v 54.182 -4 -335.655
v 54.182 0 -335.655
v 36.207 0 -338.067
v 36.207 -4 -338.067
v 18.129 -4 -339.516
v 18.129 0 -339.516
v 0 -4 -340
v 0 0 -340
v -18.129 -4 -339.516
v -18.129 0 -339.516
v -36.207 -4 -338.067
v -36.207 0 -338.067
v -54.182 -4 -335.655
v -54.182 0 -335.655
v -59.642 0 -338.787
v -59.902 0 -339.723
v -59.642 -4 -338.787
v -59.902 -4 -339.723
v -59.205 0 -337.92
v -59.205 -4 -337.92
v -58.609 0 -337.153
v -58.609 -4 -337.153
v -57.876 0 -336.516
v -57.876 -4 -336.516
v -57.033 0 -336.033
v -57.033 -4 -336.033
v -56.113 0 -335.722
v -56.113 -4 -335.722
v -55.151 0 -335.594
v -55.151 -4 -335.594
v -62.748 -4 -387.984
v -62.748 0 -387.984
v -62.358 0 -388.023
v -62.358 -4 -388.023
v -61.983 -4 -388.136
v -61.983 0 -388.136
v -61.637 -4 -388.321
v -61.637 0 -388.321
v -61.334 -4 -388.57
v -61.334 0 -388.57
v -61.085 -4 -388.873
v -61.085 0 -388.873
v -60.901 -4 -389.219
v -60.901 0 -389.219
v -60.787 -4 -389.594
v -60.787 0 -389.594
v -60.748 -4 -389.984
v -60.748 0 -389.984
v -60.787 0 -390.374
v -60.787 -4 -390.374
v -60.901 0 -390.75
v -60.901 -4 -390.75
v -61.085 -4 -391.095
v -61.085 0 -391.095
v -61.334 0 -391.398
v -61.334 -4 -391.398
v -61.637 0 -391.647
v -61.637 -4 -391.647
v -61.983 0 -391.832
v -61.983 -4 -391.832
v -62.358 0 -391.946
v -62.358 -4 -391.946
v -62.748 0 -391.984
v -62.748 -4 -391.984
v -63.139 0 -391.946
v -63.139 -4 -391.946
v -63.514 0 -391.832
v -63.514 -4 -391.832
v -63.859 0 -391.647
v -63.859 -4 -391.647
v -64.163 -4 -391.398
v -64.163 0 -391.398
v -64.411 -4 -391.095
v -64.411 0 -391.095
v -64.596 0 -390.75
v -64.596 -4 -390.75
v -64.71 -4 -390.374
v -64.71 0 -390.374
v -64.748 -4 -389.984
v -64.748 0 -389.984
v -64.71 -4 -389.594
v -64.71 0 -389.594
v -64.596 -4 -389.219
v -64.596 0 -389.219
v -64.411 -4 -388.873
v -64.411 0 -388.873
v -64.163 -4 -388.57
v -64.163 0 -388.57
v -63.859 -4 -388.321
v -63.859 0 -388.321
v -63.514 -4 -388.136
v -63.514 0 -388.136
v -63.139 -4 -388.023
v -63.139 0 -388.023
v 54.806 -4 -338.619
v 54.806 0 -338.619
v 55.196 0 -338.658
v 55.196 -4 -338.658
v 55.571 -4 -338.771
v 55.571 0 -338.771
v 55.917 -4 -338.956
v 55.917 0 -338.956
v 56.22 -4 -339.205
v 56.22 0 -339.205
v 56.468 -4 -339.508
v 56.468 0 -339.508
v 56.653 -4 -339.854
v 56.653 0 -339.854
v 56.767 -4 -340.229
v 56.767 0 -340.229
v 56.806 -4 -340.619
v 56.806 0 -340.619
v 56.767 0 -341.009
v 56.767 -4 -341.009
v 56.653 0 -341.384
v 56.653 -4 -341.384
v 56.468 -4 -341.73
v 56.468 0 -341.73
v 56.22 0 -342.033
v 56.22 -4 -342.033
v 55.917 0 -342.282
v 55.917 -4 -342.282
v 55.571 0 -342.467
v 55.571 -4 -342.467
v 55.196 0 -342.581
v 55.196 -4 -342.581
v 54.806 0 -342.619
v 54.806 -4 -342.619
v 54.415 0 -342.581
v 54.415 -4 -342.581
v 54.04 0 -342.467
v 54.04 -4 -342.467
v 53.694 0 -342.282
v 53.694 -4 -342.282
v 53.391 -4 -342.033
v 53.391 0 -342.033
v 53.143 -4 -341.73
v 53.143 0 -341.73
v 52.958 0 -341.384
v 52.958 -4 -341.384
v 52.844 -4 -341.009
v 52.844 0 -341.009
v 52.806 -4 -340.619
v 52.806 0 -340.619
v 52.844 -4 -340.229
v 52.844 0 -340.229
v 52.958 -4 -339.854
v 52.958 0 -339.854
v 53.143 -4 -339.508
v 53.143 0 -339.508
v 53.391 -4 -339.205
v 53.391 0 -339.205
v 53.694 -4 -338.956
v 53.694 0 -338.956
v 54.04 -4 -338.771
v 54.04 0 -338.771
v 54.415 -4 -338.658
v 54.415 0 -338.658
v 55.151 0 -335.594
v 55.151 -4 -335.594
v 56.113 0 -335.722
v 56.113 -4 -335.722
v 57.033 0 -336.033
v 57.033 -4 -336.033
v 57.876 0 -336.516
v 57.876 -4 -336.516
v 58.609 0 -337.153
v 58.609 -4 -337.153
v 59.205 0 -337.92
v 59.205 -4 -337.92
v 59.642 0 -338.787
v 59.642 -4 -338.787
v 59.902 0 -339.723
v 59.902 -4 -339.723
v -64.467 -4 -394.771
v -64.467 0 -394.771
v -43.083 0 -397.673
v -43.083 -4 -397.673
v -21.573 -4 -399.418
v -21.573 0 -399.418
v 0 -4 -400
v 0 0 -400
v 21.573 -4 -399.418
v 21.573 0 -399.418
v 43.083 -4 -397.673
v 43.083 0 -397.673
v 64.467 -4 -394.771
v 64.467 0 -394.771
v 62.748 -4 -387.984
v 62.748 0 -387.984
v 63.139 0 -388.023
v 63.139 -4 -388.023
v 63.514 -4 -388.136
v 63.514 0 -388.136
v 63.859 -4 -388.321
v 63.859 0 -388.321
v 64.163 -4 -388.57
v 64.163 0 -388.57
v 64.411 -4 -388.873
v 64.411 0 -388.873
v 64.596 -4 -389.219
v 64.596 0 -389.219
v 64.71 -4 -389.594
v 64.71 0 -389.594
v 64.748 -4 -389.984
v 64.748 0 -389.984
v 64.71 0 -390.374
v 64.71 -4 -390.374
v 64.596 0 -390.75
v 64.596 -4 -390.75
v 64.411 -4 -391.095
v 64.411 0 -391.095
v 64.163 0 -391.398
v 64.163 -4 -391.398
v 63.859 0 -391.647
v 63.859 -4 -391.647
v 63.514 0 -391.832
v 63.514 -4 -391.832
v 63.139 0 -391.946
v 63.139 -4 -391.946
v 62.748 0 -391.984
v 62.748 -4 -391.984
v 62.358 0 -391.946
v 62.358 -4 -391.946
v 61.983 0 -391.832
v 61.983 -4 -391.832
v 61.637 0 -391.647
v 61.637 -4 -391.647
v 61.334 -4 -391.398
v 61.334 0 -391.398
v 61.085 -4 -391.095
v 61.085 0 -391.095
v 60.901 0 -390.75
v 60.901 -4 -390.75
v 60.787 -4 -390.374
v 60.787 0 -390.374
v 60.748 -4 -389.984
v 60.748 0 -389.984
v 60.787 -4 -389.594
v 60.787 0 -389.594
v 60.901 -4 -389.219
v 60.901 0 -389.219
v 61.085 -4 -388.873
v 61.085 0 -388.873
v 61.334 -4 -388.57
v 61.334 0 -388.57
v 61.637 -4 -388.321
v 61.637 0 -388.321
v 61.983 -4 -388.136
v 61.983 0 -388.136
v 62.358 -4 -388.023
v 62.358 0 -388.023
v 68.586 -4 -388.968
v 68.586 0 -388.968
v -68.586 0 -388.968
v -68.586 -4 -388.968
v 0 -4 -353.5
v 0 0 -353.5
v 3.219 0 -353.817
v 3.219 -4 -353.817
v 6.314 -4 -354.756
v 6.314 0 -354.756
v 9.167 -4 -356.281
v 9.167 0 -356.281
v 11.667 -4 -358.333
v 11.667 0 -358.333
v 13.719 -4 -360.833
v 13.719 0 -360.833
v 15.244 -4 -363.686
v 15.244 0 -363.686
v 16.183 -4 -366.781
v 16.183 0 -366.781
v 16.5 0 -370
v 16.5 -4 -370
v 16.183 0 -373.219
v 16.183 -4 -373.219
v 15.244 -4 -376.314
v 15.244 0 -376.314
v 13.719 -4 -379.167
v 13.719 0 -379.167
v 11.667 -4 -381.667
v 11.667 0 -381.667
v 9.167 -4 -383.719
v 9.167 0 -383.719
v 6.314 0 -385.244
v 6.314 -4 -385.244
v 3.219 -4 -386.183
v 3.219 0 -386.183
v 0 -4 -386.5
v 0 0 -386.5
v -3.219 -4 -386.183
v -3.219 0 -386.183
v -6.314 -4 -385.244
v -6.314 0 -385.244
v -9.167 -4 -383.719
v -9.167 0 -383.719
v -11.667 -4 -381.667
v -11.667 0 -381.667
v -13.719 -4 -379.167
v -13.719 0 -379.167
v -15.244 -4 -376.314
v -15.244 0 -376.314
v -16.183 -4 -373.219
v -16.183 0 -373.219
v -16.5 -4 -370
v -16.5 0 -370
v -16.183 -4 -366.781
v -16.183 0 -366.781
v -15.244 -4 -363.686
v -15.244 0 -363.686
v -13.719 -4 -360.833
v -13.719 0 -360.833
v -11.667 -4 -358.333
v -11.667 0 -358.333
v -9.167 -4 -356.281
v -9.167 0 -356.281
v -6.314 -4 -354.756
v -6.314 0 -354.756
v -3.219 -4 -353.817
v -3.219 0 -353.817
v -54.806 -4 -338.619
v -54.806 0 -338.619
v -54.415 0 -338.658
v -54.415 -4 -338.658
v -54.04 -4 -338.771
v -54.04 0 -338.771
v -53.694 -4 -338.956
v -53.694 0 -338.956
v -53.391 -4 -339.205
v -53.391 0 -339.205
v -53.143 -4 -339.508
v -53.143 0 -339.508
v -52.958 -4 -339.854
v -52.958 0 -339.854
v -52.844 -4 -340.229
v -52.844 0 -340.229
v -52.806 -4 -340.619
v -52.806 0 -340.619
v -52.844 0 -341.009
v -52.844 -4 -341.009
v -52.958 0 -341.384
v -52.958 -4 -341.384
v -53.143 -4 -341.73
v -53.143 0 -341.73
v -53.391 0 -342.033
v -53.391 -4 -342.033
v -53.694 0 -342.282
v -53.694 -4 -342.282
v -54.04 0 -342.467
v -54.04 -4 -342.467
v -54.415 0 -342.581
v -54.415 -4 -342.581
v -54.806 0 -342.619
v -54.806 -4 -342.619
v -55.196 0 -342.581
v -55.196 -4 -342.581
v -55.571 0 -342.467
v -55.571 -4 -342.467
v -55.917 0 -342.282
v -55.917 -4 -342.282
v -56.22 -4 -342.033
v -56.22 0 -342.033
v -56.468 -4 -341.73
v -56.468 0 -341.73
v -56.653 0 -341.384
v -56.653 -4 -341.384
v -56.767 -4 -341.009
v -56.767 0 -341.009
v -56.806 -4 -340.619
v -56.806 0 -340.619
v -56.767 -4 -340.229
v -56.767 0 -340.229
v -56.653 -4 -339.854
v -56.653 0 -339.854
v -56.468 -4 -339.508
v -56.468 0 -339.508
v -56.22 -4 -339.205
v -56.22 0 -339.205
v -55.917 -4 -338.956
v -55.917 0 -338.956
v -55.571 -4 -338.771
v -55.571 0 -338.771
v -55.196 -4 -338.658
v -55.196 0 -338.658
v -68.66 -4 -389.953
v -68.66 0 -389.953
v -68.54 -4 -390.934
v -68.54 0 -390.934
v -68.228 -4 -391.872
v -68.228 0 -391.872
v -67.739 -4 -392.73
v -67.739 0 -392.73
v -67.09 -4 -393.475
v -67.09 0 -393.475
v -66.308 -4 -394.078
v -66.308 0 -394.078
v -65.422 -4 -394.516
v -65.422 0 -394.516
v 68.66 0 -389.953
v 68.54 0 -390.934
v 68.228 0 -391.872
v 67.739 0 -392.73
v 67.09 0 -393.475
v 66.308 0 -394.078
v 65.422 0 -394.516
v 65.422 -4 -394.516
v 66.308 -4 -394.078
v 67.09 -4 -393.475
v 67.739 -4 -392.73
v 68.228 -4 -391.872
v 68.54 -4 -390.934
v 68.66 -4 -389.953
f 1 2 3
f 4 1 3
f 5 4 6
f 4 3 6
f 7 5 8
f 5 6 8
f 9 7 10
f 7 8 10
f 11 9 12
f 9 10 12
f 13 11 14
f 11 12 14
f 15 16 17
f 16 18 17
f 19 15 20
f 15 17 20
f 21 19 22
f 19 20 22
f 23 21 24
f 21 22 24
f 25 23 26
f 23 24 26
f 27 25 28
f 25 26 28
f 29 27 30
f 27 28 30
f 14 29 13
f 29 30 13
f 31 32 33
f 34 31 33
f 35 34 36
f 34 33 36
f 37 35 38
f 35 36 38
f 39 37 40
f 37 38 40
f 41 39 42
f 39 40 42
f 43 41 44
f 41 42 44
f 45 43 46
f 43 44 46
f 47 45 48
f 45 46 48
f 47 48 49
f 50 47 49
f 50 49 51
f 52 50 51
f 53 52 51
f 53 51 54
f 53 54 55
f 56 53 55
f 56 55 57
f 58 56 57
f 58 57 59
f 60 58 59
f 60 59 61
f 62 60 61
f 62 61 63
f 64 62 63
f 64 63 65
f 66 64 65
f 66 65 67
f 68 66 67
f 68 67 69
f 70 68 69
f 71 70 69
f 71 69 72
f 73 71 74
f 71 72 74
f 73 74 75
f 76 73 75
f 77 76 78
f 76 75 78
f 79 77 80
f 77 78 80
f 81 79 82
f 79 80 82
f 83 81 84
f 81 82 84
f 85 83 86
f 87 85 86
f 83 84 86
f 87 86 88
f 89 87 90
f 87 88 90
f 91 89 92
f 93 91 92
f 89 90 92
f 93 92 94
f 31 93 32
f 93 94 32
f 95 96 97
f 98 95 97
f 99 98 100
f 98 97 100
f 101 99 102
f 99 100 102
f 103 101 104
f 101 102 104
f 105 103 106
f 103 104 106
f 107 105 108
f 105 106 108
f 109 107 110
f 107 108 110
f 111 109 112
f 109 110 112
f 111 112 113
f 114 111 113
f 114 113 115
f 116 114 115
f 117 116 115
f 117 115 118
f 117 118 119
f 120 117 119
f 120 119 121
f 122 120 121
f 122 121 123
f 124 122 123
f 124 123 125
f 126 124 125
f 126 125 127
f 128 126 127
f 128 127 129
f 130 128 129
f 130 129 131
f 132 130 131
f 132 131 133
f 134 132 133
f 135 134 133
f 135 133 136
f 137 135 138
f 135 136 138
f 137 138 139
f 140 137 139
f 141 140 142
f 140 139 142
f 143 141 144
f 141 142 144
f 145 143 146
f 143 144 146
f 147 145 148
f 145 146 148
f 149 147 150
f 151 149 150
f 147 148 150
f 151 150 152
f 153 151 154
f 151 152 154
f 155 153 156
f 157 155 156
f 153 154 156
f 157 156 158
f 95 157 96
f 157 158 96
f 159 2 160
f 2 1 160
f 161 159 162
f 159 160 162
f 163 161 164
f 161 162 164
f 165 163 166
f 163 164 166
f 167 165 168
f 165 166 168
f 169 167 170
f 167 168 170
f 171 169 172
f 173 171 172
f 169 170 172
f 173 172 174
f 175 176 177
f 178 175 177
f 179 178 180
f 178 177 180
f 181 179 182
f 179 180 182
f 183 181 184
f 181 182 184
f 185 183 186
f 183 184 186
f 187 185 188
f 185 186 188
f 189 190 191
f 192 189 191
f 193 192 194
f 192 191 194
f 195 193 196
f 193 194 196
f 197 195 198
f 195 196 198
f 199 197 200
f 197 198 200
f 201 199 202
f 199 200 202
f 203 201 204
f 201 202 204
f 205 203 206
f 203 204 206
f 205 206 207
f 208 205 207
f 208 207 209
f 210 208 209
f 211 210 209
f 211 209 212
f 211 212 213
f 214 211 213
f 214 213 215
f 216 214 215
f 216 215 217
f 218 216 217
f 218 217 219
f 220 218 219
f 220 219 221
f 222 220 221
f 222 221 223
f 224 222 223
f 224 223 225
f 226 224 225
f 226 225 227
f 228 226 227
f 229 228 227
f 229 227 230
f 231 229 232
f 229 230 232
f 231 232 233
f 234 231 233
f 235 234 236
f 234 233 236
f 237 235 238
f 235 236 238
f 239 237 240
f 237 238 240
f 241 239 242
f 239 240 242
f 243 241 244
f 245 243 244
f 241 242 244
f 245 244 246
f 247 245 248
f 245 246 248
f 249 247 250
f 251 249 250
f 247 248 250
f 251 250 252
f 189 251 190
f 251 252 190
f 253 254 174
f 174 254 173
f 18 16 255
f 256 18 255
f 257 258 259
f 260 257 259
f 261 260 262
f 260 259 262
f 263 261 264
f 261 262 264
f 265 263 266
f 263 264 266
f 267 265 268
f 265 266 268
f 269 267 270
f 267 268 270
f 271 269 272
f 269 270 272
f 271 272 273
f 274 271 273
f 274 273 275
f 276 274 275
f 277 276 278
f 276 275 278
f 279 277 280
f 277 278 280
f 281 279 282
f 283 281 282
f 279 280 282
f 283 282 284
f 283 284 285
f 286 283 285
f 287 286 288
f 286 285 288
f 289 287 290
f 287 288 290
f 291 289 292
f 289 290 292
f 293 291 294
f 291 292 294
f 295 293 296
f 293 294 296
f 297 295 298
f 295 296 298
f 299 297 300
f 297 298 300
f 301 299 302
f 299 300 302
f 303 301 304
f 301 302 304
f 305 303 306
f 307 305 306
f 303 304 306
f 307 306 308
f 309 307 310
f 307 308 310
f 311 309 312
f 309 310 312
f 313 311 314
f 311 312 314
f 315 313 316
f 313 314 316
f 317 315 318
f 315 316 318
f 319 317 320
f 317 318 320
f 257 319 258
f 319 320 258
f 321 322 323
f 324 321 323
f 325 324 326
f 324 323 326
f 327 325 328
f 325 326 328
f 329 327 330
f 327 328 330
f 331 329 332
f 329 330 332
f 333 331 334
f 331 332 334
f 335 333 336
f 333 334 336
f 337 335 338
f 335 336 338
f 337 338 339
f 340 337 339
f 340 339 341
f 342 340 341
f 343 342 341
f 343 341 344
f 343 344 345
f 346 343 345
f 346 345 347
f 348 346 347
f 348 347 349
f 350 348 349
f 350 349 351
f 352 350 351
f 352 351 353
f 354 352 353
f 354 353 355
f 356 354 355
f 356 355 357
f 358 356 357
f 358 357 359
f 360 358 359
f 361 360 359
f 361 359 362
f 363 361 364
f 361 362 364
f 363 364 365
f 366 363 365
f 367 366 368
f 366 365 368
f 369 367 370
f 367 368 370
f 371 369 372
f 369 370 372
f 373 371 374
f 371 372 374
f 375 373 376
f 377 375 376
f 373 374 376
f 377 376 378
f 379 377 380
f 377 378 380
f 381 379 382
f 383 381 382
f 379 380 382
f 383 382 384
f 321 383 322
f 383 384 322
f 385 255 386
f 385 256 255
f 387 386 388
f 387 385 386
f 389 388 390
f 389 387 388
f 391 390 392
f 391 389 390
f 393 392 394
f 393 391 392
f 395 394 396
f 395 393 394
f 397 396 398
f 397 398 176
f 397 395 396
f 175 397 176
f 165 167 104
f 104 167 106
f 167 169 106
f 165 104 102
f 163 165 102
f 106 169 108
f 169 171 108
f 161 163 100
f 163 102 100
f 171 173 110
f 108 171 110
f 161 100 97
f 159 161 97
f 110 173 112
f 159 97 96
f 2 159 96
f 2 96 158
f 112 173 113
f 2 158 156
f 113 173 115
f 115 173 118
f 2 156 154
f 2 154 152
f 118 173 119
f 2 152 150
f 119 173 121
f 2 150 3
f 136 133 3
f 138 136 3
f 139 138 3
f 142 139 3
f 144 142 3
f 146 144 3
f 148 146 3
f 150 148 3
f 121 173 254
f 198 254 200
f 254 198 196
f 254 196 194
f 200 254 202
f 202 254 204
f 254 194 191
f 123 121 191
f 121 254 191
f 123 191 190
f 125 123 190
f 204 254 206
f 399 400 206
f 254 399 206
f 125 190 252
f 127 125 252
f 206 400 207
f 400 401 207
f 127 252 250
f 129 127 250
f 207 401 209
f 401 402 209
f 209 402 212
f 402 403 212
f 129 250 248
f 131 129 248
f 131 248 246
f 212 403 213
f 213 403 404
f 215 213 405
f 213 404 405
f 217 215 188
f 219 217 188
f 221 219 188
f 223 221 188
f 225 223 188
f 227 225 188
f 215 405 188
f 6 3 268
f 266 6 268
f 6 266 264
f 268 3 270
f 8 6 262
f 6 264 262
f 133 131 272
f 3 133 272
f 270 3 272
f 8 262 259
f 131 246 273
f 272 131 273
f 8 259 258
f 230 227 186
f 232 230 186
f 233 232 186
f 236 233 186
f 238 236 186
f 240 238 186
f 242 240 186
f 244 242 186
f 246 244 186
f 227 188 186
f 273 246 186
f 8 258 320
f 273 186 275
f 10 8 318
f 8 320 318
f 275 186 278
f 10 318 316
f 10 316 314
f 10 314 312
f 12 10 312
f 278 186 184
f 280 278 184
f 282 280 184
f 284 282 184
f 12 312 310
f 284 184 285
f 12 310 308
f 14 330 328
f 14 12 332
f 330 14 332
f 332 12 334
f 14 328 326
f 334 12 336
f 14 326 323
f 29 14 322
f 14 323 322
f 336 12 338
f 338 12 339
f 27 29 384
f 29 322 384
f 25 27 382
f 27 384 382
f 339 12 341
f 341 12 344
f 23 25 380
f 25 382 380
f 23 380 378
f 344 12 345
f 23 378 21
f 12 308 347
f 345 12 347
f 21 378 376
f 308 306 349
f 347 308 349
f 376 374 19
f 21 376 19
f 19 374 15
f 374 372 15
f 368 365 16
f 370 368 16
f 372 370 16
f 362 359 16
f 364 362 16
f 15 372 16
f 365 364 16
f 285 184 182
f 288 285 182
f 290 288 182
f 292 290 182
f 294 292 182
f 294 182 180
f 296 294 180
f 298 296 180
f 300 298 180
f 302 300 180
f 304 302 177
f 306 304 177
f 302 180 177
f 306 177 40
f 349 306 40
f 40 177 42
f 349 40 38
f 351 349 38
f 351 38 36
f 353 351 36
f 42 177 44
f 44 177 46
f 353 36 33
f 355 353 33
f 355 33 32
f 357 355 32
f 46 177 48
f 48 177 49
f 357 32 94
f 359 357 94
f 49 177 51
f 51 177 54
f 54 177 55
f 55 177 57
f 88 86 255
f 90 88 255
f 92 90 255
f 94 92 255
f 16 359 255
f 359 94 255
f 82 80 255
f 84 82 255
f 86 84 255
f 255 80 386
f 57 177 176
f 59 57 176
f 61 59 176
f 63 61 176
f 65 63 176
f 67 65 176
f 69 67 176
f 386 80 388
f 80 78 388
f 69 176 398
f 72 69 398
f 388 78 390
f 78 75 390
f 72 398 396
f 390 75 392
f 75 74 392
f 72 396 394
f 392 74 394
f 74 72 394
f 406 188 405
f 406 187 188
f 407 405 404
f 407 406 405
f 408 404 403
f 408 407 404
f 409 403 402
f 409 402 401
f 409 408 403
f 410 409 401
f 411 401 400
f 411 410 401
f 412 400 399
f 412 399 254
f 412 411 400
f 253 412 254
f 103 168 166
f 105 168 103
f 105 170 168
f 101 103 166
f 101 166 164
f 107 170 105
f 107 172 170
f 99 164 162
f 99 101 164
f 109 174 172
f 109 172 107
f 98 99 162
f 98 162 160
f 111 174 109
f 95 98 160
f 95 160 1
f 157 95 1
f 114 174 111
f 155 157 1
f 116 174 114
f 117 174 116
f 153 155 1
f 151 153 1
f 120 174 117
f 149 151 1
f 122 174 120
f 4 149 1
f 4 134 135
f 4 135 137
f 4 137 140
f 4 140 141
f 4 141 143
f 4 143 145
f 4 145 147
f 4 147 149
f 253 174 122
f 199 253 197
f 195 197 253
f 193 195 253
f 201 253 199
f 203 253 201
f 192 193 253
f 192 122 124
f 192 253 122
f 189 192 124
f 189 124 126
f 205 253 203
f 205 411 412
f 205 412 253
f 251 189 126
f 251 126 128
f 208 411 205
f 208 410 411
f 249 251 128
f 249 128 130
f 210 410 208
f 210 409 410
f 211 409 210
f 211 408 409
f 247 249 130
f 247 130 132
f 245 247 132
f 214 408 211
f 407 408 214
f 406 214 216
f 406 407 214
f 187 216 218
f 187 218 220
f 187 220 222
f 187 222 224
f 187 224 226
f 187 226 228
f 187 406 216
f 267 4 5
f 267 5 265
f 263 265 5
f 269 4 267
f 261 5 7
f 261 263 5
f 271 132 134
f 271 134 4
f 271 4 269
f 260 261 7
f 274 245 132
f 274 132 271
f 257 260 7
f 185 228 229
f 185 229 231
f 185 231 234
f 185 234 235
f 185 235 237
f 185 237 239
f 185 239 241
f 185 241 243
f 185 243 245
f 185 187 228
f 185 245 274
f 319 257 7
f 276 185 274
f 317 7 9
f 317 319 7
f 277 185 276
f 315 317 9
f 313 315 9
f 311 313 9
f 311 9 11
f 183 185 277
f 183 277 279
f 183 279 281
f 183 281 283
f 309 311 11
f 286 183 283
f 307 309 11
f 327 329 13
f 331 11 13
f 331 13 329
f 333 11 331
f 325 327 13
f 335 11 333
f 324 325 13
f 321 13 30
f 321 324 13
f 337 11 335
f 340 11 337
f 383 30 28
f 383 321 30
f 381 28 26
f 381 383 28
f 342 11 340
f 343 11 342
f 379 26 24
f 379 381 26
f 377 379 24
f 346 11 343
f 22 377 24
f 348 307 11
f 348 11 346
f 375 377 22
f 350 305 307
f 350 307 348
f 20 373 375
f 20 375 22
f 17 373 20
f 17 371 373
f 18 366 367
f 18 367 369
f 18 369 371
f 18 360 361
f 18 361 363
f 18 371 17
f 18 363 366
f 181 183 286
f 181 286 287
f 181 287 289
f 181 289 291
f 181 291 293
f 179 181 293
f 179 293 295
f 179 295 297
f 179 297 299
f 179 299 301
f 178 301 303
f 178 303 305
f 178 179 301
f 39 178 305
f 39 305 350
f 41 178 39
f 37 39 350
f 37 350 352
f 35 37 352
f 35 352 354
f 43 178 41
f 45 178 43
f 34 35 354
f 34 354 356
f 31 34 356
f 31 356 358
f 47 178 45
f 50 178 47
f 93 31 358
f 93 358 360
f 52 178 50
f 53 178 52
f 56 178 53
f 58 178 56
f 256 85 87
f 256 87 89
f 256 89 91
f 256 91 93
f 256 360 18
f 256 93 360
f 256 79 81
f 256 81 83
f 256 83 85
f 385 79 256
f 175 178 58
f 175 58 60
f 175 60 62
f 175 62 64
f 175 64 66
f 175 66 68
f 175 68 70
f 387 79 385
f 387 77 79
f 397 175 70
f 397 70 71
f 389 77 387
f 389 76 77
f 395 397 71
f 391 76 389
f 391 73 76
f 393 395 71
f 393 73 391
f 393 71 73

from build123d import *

# Parameters (mm, degrees)
SKETCH_1_R             = 16.5
SM_BASE_FLANGE_1_DEPTH = 4
SKETCH_4_R             = 2
CUT_EXTRUDE_1_DEPTH    = 10
FILLET_3_R             = 5


# Sheet-metal steps are written as plain solids
with BuildPart() as part:
    # Sketch 1 → Базовая кромка1 (new body)
    with BuildSketch(Plane(origin=(0, 0, 0), x_dir=(1, 0, 0), z_dir=(0, 1, 0))):
        with BuildLine():
            Line((-59.040380407, 334.834636024), (-69.459271067, 393.923101205))
            ThreePointArc((-69.459271067, 393.923101205), (0, 400), (69.459271067, 393.923101205))
            Line((69.459271067, 393.923101205), (59.040380407, 334.834636024))
            ThreePointArc((59.040380407, 334.834636024), (0, 340), (-59.040380407, 334.834636024))
        make_face()
        with Locations(Location((0, 370, 0), (0, 0, 270))):
            Circle(SKETCH_1_R, mode=Mode.SUBTRACT)
    extrude(amount=-SM_BASE_FLANGE_1_DEPTH)

    # Эскиз4 → Вырез-Вытянуть1 (cut)
    with BuildSketch(Plane(origin=(0, 0, 0), x_dir=(1, 0, 0), z_dir=(0, 1, 0))):
        with Locations(Location((62.748327317, 389.984163036, 0), (0, 0, 270))):
            Circle(SKETCH_4_R)
        with Locations(Location((54.805501074, 340.619079107, 0), (0, 0, 270))):
            Circle(SKETCH_4_R)
        with Locations(Location((-54.805501074, 340.619079107, 0), (0, 0, 270))):
            Circle(SKETCH_4_R)
        with Locations(Location((-62.748327317, 389.984163036, 0), (0, 0, 270))):
            Circle(SKETCH_4_R)
    extrude(amount=-CUT_EXTRUDE_1_DEPTH, mode=Mode.SUBTRACT)

    # Скругление3
    fillet_3_edges = [part.edges().sort_by_distance(p)[0] for p in [
        (-59.040380407, -2, -334.834636024),
        (-69.459271067, -2, -393.923101205),
        (69.459271067, -2, -393.923101205),
        (59.040380407, -2, -334.834636024),
    ]]
    fillet(fillet_3_edges, radius=FILLET_3_R)


solid = part.part
